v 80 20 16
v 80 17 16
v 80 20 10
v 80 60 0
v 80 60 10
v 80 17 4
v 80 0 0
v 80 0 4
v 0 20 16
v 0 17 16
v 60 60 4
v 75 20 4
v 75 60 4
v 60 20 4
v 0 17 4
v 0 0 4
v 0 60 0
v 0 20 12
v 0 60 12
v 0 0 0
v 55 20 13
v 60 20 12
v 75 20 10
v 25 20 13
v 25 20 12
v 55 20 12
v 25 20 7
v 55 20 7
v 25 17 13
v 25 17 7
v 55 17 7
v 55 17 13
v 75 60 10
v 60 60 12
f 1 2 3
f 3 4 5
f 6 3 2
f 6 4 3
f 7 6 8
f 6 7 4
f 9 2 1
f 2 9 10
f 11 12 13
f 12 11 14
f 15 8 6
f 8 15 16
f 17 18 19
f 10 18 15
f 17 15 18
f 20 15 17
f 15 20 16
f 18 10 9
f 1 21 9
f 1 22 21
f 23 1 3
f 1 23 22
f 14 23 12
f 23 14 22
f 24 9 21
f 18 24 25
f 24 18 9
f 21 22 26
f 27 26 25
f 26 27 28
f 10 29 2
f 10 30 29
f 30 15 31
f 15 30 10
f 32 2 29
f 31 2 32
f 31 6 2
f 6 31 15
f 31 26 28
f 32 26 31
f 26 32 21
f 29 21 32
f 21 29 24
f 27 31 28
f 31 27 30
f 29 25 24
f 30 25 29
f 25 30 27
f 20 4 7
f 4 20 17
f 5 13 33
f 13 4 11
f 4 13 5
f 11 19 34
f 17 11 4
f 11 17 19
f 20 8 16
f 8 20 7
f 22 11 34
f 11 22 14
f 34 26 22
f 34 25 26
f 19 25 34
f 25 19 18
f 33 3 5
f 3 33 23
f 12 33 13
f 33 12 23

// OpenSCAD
// Parameters
base_width = 80;
base_depth = 60;
base_height = 4;

rear_width = 60;
rear_depth = 40;
rear_height = 8;

side_strip_width = 5;
side_strip_depth = rear_depth;
side_strip_height = 6;

transverse_width = base_width;
transverse_depth = 3;
transverse_height = 12;

hole_width = 30;
hole_height = 6;

$fn = 100;

// Base slab
module base() {
    cube([base_width, base_depth, base_height]);
}

// Rear raised portion
module rear_block() {
    translate([0, base_depth - rear_depth, base_height])
        cube([rear_width, rear_depth, rear_height]);
}

// Left side strip
module left_strip() {
    translate([0, base_depth - side_strip_depth, base_height])
        cube([side_strip_width, side_strip_depth, side_strip_height]);
}

// Right side strip
module right_strip() {
    translate([base_width - side_strip_width, base_depth - side_strip_depth, base_height])
        cube([side_strip_width, side_strip_depth, side_strip_height]);
}

// Transverse feature with internal opening
module transverse_feature() {
    translate([0, base_depth - rear_depth - transverse_depth, base_height])
        difference() {
            // Outer shell
            cube([transverse_width, transverse_depth, transverse_height]);
            // Internal opening
            translate([(transverse_width - hole_width)/2, -1, (transverse_height - hole_height)/2])
                cube([hole_width, transverse_depth + 2, hole_height]);
        }
}

// Main assembly
union() {
    base();
    rear_block();
    left_strip();
    right_strip();
    transverse_feature();
}
